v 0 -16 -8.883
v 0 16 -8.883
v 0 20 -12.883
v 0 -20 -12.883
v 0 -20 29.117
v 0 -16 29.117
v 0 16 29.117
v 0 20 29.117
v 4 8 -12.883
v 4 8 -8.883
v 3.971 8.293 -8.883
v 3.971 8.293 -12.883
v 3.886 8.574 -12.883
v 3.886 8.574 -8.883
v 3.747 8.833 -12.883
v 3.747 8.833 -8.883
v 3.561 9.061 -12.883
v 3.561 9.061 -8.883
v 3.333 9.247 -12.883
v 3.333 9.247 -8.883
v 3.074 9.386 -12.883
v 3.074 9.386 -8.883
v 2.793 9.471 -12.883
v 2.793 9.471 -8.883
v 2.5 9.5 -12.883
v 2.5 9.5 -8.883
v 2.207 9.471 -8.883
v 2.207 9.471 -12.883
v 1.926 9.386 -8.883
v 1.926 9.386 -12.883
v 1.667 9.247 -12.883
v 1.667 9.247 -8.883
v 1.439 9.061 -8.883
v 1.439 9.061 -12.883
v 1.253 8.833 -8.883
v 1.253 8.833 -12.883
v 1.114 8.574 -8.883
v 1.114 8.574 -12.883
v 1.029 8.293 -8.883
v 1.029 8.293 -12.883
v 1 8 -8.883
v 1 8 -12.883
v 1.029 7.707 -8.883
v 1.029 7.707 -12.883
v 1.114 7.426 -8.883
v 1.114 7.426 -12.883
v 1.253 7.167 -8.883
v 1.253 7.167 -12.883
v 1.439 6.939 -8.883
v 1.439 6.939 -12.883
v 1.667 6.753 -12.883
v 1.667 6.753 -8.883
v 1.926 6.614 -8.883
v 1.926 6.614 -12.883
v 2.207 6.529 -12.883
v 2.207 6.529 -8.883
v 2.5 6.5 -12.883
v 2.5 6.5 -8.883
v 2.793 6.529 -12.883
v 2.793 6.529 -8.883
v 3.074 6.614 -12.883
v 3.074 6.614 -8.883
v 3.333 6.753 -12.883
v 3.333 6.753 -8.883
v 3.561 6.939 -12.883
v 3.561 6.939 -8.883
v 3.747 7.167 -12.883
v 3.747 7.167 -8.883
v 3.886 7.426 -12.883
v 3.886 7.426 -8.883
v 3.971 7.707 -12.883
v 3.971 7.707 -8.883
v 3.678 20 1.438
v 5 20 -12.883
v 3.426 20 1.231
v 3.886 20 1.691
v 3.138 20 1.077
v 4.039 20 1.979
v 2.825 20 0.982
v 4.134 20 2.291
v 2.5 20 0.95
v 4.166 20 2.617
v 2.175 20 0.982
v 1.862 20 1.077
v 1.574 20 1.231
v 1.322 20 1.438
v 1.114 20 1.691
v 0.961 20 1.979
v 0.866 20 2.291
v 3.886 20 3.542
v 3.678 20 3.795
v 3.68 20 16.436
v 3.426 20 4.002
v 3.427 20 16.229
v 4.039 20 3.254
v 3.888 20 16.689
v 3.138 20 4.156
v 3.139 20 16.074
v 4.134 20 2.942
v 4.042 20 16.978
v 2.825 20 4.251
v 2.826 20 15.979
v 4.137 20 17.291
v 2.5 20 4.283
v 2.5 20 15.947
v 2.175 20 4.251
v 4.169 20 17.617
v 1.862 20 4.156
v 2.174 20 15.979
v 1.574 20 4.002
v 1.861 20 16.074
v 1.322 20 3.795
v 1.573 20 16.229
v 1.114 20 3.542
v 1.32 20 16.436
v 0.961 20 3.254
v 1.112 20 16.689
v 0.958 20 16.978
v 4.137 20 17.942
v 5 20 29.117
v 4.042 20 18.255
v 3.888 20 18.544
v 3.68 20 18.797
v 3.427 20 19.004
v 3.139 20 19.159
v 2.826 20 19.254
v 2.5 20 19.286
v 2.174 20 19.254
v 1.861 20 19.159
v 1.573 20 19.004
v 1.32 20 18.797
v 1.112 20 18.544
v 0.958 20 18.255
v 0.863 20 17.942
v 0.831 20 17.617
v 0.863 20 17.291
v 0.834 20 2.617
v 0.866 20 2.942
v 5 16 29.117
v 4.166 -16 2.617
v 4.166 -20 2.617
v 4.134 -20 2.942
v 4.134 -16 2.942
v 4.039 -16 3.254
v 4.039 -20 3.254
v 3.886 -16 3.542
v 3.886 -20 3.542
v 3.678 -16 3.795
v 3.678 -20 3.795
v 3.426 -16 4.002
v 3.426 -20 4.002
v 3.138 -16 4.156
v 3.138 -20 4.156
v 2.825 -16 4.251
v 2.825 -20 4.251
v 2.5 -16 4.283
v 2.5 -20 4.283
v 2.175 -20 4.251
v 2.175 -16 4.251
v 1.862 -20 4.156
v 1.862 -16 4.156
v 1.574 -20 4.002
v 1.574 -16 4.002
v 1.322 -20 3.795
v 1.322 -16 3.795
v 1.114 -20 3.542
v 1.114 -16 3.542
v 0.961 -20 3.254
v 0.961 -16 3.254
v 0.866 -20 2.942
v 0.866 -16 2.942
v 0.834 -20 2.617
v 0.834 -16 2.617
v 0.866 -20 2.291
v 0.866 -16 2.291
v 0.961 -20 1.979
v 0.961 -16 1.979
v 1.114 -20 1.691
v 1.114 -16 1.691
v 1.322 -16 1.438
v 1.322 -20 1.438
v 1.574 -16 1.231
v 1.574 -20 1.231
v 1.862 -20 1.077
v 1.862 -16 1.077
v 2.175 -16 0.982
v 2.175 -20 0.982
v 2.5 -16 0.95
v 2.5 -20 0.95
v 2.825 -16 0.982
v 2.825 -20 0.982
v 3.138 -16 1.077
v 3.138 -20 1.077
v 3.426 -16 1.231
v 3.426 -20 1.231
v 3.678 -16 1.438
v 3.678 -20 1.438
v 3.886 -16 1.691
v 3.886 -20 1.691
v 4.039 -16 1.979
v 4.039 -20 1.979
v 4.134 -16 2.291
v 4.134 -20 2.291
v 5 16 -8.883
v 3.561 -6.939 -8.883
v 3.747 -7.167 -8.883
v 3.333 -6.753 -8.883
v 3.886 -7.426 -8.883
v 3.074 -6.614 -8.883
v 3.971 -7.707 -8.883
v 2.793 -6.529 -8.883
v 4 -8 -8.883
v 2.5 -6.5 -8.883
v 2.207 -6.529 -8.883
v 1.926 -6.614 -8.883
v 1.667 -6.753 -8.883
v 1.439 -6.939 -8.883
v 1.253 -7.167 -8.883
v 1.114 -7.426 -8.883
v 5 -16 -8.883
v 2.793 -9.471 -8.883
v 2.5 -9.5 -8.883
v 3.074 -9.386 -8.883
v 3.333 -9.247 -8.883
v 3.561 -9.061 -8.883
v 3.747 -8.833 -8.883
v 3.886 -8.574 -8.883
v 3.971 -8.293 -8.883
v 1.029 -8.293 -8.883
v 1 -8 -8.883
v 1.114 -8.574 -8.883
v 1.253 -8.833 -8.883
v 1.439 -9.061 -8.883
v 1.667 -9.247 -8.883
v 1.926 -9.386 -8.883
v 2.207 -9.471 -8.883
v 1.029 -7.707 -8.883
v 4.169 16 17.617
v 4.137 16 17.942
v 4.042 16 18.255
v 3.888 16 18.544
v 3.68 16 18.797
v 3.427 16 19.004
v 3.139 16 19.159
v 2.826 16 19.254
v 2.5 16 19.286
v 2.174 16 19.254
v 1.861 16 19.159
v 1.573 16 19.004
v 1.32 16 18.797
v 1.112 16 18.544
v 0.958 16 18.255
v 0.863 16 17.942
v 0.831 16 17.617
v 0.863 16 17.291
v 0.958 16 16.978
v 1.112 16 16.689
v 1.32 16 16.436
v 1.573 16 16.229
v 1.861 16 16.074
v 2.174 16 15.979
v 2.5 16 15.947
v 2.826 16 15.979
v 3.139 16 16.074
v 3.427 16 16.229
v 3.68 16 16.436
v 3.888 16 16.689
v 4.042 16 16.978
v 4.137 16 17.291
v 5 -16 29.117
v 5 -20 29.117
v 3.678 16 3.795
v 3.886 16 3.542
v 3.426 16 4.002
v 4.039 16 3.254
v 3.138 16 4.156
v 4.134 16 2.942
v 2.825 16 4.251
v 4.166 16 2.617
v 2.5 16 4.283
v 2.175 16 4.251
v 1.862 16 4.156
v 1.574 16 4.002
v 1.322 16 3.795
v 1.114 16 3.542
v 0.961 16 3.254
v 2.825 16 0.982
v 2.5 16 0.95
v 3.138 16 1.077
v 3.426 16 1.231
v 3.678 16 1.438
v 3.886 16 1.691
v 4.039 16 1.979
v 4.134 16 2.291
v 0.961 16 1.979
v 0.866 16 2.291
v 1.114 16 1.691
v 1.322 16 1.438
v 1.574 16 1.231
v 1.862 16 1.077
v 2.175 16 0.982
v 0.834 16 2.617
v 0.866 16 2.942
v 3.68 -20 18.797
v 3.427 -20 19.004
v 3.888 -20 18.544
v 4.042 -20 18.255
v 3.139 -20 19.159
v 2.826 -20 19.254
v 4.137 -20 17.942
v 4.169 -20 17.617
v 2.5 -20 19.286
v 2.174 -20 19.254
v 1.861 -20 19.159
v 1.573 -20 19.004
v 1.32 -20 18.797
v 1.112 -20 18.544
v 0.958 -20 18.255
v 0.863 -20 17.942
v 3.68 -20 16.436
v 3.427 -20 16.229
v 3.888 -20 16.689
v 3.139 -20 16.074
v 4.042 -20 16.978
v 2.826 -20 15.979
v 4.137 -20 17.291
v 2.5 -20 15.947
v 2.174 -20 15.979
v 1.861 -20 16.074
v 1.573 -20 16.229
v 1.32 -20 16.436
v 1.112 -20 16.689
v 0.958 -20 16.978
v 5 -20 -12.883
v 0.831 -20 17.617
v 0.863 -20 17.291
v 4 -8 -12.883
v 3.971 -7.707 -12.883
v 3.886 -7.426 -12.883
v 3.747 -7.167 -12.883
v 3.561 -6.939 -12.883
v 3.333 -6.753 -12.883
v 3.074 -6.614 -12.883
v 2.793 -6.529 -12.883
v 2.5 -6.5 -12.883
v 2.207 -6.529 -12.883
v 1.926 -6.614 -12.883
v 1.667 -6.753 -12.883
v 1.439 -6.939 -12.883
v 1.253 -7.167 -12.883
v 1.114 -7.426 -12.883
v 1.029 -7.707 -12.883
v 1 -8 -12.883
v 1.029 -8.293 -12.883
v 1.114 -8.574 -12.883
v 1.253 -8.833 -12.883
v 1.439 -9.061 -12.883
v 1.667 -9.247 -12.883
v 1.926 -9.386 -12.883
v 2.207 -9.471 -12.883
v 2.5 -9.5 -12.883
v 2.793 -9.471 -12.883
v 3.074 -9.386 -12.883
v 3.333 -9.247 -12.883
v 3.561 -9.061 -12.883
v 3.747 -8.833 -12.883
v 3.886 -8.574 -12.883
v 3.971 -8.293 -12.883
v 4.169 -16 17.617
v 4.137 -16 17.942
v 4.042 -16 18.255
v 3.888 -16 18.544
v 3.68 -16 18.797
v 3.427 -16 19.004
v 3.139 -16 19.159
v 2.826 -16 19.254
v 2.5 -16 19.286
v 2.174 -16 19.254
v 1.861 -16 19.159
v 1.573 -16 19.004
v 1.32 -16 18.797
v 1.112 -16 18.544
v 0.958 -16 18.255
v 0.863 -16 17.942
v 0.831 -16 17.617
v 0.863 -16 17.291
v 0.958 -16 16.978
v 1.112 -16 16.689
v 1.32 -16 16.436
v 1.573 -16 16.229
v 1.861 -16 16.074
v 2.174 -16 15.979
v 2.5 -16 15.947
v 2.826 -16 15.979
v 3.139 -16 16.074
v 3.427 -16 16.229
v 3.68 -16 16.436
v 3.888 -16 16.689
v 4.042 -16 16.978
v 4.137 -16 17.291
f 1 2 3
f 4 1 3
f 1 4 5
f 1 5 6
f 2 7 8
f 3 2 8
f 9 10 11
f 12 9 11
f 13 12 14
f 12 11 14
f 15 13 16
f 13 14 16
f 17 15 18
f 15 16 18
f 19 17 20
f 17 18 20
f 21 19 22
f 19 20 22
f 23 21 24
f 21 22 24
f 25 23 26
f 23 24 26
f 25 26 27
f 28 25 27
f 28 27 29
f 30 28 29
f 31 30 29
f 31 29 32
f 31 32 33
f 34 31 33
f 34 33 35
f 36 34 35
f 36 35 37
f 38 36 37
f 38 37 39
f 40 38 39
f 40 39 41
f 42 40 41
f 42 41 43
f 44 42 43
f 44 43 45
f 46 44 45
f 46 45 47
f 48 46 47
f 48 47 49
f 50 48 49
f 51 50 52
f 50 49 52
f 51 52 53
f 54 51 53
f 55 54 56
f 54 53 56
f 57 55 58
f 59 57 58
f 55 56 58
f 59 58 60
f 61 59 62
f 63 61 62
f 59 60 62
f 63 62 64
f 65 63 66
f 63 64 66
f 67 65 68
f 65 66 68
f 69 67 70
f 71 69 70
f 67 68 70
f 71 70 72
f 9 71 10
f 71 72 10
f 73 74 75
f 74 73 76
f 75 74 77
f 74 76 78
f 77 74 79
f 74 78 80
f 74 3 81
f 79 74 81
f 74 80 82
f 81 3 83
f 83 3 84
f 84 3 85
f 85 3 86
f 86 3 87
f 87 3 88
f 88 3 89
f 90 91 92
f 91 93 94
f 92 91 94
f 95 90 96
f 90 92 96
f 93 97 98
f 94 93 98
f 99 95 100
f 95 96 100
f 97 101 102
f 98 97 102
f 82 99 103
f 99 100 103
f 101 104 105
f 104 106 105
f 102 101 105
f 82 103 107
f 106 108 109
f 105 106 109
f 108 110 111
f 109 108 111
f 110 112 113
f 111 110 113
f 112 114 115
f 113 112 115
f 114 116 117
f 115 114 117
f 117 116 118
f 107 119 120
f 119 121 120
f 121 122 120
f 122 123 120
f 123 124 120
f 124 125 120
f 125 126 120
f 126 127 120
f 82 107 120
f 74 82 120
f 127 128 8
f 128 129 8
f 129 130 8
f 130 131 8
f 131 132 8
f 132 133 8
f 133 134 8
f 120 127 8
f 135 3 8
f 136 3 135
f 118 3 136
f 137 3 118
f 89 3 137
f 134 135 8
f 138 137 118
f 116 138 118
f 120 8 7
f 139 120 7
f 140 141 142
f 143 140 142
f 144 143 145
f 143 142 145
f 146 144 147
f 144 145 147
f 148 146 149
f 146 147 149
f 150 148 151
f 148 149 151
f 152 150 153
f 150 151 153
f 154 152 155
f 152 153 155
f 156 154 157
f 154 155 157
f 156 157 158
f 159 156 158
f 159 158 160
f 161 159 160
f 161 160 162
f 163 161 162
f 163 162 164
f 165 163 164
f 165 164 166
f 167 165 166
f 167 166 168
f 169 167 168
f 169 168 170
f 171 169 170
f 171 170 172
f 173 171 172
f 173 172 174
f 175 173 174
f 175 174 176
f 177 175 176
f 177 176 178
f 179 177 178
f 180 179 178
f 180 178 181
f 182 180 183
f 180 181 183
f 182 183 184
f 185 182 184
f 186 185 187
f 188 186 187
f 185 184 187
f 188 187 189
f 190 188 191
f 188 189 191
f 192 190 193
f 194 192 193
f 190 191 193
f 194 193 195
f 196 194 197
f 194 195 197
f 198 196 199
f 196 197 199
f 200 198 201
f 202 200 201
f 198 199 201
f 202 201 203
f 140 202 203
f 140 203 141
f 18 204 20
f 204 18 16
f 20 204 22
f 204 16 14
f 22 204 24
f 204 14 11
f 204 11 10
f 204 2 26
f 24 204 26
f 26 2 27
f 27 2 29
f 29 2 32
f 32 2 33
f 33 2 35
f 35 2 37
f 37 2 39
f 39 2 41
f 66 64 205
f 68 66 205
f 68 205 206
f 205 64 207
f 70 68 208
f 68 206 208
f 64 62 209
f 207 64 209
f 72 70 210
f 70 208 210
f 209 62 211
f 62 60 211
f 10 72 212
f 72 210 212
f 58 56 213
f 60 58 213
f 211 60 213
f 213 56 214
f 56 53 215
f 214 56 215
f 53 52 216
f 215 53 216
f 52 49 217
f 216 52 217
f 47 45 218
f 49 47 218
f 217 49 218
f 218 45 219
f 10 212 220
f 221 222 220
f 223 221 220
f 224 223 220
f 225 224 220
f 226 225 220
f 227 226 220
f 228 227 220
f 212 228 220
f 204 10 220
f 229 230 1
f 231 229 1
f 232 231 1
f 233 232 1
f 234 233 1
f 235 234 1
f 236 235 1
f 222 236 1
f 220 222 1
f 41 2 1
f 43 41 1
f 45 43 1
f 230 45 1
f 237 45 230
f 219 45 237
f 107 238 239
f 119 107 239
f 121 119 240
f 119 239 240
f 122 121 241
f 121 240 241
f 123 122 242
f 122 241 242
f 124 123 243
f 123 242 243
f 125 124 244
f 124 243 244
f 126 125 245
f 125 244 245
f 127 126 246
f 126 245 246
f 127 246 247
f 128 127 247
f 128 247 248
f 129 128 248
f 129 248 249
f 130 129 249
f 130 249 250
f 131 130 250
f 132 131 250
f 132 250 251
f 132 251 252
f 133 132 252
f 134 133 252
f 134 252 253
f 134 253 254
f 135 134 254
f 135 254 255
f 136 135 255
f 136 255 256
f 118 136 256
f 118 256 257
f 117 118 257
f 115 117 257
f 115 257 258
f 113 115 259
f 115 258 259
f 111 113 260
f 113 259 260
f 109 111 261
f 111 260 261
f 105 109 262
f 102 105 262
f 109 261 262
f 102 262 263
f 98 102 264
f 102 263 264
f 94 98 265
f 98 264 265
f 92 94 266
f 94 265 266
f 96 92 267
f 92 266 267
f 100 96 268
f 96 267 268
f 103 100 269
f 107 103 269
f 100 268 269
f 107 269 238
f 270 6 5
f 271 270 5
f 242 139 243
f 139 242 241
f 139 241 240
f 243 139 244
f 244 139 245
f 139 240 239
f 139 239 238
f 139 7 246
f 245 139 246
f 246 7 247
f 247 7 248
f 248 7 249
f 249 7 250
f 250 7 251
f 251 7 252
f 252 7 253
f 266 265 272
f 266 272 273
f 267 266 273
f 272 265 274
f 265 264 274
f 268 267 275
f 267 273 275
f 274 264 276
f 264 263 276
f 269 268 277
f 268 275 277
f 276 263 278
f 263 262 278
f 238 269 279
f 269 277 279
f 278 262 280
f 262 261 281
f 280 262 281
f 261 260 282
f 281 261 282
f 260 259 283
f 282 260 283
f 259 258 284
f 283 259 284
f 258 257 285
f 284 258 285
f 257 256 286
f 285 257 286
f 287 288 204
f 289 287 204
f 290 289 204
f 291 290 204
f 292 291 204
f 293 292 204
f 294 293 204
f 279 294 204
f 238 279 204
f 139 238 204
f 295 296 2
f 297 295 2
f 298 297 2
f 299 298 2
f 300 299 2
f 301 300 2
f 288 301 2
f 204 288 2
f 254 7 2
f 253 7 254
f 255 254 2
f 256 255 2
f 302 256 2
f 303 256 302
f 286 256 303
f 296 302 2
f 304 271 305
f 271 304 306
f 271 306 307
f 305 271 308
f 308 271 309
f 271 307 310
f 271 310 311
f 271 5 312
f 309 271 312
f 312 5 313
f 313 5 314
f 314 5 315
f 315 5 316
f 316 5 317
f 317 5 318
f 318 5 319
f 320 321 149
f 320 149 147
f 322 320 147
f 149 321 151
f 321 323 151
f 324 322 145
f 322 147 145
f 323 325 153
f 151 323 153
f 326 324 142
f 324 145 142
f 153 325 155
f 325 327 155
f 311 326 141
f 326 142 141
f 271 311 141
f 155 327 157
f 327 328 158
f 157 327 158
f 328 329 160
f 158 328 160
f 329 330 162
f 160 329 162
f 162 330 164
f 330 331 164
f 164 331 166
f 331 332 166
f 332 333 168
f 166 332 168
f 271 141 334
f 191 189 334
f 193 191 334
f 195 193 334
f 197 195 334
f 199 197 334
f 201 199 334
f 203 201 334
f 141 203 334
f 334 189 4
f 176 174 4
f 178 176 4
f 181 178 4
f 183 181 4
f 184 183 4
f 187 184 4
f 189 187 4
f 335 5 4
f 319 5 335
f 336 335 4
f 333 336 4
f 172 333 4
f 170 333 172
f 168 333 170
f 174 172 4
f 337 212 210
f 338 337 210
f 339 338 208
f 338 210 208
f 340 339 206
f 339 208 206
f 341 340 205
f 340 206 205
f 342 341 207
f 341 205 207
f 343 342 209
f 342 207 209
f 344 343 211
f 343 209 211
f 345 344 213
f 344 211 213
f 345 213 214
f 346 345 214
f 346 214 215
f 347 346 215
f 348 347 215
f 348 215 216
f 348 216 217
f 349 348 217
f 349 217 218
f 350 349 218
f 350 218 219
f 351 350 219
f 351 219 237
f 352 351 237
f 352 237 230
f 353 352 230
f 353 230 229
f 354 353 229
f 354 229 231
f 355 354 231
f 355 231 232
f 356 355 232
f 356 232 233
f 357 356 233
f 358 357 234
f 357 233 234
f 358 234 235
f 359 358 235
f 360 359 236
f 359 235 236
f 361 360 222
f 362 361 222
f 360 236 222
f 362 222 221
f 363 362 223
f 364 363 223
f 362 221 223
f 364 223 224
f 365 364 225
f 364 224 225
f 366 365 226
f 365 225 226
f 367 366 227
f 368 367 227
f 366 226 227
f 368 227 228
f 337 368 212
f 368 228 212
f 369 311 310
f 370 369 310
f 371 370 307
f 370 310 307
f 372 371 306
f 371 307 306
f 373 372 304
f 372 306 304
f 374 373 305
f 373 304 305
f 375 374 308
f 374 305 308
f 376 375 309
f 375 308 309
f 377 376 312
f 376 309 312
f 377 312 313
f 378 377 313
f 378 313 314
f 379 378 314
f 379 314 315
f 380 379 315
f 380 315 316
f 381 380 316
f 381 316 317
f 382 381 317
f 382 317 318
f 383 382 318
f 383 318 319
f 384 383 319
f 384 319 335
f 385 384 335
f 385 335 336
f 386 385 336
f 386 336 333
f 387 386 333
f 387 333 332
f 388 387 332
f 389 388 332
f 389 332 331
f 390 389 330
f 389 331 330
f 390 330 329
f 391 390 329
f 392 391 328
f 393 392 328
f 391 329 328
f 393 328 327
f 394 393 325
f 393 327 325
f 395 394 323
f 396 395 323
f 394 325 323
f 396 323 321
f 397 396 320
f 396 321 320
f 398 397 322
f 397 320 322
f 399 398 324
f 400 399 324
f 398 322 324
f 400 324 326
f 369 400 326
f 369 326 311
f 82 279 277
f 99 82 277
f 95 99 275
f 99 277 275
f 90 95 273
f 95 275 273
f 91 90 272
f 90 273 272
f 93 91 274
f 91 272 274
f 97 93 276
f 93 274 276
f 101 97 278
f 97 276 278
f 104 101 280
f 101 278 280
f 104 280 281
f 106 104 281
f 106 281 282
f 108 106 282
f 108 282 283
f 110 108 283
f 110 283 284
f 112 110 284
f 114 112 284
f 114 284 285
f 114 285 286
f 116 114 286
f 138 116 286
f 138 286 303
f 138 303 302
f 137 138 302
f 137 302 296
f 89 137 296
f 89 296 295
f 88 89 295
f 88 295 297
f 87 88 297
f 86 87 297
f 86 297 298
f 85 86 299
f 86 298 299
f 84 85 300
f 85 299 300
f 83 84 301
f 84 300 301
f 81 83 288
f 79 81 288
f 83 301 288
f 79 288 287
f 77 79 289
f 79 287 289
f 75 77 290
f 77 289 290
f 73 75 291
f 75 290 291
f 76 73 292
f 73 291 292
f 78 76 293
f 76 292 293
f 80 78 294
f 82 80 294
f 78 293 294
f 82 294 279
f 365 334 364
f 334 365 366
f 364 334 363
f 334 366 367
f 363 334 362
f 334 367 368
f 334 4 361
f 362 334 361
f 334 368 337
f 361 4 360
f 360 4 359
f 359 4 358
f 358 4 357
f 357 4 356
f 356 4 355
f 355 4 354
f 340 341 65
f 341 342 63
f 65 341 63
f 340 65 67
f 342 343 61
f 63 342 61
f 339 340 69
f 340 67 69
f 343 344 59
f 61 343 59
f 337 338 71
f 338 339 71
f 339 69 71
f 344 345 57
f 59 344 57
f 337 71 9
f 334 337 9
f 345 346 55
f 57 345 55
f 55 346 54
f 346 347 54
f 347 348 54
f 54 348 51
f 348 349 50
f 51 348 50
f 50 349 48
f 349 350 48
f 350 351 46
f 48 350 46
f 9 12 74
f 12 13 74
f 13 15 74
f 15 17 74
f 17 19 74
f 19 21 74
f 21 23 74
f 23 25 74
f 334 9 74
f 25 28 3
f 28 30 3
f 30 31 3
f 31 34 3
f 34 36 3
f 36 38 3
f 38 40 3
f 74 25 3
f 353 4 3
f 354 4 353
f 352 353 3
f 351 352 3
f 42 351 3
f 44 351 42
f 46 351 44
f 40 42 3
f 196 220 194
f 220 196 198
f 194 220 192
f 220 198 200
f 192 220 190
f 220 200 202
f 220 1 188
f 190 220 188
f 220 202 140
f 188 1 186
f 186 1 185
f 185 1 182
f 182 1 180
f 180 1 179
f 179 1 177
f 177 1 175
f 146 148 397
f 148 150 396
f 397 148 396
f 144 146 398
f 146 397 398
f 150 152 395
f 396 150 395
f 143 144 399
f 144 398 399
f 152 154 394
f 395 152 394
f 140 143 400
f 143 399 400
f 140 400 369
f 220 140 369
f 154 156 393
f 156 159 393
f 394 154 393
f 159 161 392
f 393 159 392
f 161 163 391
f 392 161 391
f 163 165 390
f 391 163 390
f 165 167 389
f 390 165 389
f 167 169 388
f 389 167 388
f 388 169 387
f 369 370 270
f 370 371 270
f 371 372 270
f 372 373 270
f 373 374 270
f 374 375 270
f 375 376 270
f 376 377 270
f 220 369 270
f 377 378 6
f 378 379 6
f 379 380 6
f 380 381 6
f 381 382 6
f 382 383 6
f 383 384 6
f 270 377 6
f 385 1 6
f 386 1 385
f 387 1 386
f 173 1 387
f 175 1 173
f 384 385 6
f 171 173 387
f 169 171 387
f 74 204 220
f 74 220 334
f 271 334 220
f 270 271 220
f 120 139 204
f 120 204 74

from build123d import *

# Parameters (mm, degrees)
F1_DEPTH = 5
F2_R     = 1.669174
F2_R_2   = 1.66634
F3_DEPTH = 40.001
F4_R     = 1.5
F5_DEPTH = 4.001


with BuildPart() as f1:
    # F0 (on Right) → F1 (new body)
    with BuildSketch(Plane.YZ):
        Polygon((16, -8.883437), (0, -8.883437), (-16, -8.883437), (-16, 29.116563), (-20, 29.116563), (-20, -12.883437), (0, -12.883437), (20, -12.883437), (20, 29.116563), (16, 29.116563), align=None)
    extrude(amount=F1_DEPTH)

    # F2 (on face) → F3 (cut, through all)
    with BuildSketch(Plane.XZ.offset(20)):
        with Locations((2.5, 17.616563)):
            Circle(F2_R)
        with Locations((2.5, 2.616563)):
            Circle(F2_R_2)
    extrude(amount=-F3_DEPTH, mode=Mode.SUBTRACT)

    # F4 (on face) → F5 (cut, through all)
    with BuildSketch(Plane.XY.offset(-8.883437)):
        with Locations((2.5, -8)):
            Circle(F4_R)
        with Locations((2.5, 8)):
            Circle(F4_R)
    extrude(amount=-F5_DEPTH, mode=Mode.SUBTRACT)


solid = f1.part
